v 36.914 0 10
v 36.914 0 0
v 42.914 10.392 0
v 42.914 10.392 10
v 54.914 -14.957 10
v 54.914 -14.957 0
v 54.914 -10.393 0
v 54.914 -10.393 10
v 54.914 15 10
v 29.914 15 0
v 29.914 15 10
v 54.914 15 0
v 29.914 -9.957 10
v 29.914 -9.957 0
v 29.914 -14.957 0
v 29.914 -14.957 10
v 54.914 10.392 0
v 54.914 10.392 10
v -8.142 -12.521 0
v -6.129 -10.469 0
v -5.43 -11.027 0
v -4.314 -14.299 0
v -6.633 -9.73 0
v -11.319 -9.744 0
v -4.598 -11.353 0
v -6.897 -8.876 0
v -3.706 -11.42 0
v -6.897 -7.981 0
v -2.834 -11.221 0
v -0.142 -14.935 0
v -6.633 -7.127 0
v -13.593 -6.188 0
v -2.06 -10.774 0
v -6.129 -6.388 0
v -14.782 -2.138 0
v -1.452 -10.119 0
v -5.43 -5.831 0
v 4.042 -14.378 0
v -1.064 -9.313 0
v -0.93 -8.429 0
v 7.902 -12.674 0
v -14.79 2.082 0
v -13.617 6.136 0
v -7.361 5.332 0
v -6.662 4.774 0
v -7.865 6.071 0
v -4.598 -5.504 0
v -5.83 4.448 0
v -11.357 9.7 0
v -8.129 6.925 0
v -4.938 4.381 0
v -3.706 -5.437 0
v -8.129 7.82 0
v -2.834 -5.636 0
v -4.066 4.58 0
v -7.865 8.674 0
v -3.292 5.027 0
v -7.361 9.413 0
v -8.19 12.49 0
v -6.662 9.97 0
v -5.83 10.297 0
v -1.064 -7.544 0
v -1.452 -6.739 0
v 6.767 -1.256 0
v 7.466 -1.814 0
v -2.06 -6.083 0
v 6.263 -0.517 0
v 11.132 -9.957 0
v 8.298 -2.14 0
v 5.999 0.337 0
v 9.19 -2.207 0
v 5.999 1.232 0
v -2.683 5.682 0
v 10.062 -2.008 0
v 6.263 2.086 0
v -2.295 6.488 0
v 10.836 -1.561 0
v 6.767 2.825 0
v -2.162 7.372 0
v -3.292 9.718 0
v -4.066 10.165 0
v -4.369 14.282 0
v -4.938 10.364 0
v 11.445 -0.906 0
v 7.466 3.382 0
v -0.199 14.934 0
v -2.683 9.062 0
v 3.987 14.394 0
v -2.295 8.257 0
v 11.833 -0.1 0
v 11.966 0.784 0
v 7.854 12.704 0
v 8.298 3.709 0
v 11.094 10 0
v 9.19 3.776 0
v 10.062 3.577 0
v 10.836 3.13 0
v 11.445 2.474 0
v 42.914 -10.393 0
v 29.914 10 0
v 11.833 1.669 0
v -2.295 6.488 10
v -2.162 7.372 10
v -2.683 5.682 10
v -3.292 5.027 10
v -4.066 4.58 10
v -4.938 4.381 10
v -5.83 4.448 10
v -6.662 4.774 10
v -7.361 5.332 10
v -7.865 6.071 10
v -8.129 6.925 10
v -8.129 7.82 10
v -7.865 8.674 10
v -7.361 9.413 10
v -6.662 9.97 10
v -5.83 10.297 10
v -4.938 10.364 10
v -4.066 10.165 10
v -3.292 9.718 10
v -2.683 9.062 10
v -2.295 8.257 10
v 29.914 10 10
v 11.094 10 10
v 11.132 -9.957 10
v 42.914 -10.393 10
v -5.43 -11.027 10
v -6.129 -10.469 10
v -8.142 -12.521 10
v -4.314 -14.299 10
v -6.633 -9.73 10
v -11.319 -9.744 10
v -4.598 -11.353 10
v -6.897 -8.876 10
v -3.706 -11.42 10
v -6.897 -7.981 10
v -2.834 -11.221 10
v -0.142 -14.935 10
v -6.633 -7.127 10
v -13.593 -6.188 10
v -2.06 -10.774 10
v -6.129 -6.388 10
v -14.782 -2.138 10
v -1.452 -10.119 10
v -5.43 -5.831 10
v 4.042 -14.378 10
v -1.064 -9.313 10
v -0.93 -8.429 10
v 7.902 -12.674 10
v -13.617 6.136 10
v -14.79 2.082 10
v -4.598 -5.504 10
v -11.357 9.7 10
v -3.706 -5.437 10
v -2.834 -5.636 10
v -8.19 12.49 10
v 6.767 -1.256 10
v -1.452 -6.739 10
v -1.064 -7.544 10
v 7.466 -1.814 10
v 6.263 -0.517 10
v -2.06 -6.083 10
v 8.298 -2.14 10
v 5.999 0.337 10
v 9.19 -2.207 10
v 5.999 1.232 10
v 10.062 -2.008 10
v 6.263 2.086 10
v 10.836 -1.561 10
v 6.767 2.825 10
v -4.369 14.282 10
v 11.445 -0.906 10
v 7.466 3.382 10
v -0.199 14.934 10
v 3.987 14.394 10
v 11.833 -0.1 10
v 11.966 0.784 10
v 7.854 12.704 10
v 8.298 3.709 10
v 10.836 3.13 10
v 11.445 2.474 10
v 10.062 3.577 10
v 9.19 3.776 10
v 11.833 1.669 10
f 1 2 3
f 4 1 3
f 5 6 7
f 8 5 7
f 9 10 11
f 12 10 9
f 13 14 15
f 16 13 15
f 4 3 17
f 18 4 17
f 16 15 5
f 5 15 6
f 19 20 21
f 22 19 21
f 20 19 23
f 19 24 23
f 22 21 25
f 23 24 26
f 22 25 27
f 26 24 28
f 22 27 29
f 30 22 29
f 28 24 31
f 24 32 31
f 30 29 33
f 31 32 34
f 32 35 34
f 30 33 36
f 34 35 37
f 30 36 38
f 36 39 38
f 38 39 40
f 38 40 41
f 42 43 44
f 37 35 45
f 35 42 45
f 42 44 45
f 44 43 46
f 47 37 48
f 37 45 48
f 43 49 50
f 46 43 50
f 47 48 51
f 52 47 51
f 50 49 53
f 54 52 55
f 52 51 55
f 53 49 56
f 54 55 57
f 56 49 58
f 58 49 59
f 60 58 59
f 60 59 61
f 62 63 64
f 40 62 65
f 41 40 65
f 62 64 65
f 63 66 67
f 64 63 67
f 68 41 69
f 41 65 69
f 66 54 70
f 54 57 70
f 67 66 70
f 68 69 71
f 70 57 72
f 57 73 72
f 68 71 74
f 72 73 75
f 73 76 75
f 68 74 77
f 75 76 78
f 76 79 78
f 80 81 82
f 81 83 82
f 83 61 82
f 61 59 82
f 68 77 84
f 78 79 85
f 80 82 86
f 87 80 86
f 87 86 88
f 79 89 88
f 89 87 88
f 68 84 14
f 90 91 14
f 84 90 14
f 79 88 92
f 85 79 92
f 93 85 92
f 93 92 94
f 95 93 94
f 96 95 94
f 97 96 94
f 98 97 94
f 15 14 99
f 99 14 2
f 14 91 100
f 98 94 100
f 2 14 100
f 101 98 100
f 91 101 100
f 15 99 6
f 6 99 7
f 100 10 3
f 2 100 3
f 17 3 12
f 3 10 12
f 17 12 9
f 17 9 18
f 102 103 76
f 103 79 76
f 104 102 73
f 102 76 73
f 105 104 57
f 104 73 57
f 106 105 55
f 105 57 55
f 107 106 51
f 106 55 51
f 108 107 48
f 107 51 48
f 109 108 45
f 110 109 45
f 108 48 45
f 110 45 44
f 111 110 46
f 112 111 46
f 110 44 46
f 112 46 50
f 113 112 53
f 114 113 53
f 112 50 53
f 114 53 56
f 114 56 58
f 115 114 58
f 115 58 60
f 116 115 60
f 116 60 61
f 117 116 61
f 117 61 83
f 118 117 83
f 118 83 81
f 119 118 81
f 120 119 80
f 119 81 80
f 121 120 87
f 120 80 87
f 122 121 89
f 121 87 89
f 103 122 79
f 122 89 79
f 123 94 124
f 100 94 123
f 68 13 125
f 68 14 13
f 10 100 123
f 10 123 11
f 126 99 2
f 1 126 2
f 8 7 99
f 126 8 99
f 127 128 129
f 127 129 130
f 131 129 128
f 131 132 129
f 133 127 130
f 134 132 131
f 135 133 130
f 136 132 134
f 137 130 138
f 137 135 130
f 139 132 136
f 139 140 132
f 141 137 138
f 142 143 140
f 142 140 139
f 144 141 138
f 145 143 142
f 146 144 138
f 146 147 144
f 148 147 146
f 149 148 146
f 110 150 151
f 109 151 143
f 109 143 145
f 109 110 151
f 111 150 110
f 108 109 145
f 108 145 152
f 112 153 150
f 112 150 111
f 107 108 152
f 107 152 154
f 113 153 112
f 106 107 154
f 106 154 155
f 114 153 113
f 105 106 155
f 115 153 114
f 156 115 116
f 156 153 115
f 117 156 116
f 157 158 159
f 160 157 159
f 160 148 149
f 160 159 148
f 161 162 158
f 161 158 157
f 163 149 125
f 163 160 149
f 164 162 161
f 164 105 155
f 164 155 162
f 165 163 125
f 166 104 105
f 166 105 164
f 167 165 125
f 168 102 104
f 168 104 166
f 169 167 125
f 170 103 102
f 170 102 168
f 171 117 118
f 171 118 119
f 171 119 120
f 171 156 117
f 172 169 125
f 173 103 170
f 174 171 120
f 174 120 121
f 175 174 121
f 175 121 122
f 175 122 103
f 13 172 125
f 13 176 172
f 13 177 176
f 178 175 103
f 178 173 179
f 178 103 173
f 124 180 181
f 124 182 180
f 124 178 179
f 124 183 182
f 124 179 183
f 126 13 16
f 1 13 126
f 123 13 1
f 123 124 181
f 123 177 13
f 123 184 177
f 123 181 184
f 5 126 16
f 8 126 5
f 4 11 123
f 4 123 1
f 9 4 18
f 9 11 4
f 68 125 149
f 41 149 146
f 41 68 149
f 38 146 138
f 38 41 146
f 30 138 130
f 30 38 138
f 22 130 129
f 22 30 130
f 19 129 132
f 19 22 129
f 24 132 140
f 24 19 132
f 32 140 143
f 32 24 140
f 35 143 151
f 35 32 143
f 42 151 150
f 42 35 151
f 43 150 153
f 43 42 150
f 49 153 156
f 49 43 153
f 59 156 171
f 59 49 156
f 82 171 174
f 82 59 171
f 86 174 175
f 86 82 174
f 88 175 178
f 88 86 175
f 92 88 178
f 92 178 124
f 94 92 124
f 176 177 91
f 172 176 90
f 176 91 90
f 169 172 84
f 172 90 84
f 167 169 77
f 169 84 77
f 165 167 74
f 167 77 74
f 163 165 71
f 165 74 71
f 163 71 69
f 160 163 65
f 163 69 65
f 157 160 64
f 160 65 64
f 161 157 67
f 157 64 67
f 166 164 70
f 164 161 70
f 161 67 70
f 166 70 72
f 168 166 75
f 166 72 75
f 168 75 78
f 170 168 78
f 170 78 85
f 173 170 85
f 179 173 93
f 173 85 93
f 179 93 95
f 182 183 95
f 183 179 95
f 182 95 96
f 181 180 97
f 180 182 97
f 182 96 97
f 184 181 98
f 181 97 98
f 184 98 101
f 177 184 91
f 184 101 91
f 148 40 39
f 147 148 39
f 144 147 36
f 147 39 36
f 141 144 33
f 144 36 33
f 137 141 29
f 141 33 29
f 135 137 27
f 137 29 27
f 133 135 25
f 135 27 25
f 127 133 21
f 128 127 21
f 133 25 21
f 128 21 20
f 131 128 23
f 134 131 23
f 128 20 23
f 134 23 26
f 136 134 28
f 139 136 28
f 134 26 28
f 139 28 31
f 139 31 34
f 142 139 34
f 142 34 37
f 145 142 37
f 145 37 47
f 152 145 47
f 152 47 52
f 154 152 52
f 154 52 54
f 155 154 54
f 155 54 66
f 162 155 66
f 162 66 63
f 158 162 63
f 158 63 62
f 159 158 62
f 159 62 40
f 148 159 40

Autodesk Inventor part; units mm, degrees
ref_plane "YZ Plane" through (0, 0, 0) normal (1, 0, 0) x (0, 1, 0)
ref_plane "XZ Plane" through (0, 0, 0) normal (0, 1, 0) x (-1, 0, 0)
ref_plane "XY Plane" through (0, 0, 0) normal (0, 0, 1) x (1, 0, 0)
sketch "Эскиз1" plane through (0, 0, 0) normal (0, 0, 1) x (1, 0, 0)
  point P0 (0, 0)
sketch "Эскиз2" plane through (0, 0, 0) normal (0, 0, 1) x (1, 0, 0)
  circle A0 centre (0, 0) radius 9
  circle A1 centre (0, 0) radius 14.9355
  line L0 (29.9138, -9.957) -> (11.1323, -9.957)
  line L1 (11.0941, 9.9995) -> (29.9138, 9.9995)
  line L2 (11.0941, 9.9995) -> (29.9138, 9.9995)
  line L3 (29.9138, 9.9995) -> (29.9138, 14.9995)
  line L4 (29.9138, 14.9995) -> (54.9138, 14.9995)
  line L5 (29.9138, -9.957) -> (29.9138, -14.9572)
  line L6 (29.9138, -14.9572) -> (54.9138, -14.9572)
  line L7 (-18.0074, -0.0005) -> (54.9138, -0.0005)
  line L8 (54.9138, 14.9995) -> (48.9138, 14.9995)
  line L9 (48.9138, 14.9995) -> (48.9138, -8.0243)
  line L10 (42.9138, 10.3918) -> (54.9138, 10.3918)
  line L11 (54.9138, -10.3928) -> (42.9138, -10.3928)
  line L12 (42.9138, -10.3928) -> (36.9138, -0.0005)
  line L13 (36.9138, -0.0005) -> (42.9138, 10.3918)
  line L14 (54.9138, 14.9995) -> (54.9138, 10.3918)
  line L15 (54.9138, -14.9572) -> (54.9138, -10.3928)
  line L16 (0, 0) -> (22.1205, 0) construction
  line L17 (0, 0) -> (18.5985, 0) construction
  line L18 (0, 0) -> (18.6696, 0) construction
  line L19 (0, 0) -> (12.4111, 0) construction
  circle A2 centre (-5.1622, 7.3724) radius 3
  circle A3 centre (-3.9303, -8.4286) radius 3
  circle A4 centre (8.9658, 0.7844) radius 3
  point P0 (48.9138, -0.0005)
  point P1 (48.9138, -0.0005)
  point P2 (48.9138, -0.0005)
extrude "Выдавливание1" add sketch "Эскиз2" along normal blind 10 contours A4 L7 A0 A2 | A0 A2 L7 A1 A4 | A4 L7 A1 A0 A3 | A0 A3 L7 A4 | L7 L12 L11 L15 L6 L5 L0 A1 | A1 L1 L3 L4 L9 L10 L13 L7 | L9 L4 L14 L10
